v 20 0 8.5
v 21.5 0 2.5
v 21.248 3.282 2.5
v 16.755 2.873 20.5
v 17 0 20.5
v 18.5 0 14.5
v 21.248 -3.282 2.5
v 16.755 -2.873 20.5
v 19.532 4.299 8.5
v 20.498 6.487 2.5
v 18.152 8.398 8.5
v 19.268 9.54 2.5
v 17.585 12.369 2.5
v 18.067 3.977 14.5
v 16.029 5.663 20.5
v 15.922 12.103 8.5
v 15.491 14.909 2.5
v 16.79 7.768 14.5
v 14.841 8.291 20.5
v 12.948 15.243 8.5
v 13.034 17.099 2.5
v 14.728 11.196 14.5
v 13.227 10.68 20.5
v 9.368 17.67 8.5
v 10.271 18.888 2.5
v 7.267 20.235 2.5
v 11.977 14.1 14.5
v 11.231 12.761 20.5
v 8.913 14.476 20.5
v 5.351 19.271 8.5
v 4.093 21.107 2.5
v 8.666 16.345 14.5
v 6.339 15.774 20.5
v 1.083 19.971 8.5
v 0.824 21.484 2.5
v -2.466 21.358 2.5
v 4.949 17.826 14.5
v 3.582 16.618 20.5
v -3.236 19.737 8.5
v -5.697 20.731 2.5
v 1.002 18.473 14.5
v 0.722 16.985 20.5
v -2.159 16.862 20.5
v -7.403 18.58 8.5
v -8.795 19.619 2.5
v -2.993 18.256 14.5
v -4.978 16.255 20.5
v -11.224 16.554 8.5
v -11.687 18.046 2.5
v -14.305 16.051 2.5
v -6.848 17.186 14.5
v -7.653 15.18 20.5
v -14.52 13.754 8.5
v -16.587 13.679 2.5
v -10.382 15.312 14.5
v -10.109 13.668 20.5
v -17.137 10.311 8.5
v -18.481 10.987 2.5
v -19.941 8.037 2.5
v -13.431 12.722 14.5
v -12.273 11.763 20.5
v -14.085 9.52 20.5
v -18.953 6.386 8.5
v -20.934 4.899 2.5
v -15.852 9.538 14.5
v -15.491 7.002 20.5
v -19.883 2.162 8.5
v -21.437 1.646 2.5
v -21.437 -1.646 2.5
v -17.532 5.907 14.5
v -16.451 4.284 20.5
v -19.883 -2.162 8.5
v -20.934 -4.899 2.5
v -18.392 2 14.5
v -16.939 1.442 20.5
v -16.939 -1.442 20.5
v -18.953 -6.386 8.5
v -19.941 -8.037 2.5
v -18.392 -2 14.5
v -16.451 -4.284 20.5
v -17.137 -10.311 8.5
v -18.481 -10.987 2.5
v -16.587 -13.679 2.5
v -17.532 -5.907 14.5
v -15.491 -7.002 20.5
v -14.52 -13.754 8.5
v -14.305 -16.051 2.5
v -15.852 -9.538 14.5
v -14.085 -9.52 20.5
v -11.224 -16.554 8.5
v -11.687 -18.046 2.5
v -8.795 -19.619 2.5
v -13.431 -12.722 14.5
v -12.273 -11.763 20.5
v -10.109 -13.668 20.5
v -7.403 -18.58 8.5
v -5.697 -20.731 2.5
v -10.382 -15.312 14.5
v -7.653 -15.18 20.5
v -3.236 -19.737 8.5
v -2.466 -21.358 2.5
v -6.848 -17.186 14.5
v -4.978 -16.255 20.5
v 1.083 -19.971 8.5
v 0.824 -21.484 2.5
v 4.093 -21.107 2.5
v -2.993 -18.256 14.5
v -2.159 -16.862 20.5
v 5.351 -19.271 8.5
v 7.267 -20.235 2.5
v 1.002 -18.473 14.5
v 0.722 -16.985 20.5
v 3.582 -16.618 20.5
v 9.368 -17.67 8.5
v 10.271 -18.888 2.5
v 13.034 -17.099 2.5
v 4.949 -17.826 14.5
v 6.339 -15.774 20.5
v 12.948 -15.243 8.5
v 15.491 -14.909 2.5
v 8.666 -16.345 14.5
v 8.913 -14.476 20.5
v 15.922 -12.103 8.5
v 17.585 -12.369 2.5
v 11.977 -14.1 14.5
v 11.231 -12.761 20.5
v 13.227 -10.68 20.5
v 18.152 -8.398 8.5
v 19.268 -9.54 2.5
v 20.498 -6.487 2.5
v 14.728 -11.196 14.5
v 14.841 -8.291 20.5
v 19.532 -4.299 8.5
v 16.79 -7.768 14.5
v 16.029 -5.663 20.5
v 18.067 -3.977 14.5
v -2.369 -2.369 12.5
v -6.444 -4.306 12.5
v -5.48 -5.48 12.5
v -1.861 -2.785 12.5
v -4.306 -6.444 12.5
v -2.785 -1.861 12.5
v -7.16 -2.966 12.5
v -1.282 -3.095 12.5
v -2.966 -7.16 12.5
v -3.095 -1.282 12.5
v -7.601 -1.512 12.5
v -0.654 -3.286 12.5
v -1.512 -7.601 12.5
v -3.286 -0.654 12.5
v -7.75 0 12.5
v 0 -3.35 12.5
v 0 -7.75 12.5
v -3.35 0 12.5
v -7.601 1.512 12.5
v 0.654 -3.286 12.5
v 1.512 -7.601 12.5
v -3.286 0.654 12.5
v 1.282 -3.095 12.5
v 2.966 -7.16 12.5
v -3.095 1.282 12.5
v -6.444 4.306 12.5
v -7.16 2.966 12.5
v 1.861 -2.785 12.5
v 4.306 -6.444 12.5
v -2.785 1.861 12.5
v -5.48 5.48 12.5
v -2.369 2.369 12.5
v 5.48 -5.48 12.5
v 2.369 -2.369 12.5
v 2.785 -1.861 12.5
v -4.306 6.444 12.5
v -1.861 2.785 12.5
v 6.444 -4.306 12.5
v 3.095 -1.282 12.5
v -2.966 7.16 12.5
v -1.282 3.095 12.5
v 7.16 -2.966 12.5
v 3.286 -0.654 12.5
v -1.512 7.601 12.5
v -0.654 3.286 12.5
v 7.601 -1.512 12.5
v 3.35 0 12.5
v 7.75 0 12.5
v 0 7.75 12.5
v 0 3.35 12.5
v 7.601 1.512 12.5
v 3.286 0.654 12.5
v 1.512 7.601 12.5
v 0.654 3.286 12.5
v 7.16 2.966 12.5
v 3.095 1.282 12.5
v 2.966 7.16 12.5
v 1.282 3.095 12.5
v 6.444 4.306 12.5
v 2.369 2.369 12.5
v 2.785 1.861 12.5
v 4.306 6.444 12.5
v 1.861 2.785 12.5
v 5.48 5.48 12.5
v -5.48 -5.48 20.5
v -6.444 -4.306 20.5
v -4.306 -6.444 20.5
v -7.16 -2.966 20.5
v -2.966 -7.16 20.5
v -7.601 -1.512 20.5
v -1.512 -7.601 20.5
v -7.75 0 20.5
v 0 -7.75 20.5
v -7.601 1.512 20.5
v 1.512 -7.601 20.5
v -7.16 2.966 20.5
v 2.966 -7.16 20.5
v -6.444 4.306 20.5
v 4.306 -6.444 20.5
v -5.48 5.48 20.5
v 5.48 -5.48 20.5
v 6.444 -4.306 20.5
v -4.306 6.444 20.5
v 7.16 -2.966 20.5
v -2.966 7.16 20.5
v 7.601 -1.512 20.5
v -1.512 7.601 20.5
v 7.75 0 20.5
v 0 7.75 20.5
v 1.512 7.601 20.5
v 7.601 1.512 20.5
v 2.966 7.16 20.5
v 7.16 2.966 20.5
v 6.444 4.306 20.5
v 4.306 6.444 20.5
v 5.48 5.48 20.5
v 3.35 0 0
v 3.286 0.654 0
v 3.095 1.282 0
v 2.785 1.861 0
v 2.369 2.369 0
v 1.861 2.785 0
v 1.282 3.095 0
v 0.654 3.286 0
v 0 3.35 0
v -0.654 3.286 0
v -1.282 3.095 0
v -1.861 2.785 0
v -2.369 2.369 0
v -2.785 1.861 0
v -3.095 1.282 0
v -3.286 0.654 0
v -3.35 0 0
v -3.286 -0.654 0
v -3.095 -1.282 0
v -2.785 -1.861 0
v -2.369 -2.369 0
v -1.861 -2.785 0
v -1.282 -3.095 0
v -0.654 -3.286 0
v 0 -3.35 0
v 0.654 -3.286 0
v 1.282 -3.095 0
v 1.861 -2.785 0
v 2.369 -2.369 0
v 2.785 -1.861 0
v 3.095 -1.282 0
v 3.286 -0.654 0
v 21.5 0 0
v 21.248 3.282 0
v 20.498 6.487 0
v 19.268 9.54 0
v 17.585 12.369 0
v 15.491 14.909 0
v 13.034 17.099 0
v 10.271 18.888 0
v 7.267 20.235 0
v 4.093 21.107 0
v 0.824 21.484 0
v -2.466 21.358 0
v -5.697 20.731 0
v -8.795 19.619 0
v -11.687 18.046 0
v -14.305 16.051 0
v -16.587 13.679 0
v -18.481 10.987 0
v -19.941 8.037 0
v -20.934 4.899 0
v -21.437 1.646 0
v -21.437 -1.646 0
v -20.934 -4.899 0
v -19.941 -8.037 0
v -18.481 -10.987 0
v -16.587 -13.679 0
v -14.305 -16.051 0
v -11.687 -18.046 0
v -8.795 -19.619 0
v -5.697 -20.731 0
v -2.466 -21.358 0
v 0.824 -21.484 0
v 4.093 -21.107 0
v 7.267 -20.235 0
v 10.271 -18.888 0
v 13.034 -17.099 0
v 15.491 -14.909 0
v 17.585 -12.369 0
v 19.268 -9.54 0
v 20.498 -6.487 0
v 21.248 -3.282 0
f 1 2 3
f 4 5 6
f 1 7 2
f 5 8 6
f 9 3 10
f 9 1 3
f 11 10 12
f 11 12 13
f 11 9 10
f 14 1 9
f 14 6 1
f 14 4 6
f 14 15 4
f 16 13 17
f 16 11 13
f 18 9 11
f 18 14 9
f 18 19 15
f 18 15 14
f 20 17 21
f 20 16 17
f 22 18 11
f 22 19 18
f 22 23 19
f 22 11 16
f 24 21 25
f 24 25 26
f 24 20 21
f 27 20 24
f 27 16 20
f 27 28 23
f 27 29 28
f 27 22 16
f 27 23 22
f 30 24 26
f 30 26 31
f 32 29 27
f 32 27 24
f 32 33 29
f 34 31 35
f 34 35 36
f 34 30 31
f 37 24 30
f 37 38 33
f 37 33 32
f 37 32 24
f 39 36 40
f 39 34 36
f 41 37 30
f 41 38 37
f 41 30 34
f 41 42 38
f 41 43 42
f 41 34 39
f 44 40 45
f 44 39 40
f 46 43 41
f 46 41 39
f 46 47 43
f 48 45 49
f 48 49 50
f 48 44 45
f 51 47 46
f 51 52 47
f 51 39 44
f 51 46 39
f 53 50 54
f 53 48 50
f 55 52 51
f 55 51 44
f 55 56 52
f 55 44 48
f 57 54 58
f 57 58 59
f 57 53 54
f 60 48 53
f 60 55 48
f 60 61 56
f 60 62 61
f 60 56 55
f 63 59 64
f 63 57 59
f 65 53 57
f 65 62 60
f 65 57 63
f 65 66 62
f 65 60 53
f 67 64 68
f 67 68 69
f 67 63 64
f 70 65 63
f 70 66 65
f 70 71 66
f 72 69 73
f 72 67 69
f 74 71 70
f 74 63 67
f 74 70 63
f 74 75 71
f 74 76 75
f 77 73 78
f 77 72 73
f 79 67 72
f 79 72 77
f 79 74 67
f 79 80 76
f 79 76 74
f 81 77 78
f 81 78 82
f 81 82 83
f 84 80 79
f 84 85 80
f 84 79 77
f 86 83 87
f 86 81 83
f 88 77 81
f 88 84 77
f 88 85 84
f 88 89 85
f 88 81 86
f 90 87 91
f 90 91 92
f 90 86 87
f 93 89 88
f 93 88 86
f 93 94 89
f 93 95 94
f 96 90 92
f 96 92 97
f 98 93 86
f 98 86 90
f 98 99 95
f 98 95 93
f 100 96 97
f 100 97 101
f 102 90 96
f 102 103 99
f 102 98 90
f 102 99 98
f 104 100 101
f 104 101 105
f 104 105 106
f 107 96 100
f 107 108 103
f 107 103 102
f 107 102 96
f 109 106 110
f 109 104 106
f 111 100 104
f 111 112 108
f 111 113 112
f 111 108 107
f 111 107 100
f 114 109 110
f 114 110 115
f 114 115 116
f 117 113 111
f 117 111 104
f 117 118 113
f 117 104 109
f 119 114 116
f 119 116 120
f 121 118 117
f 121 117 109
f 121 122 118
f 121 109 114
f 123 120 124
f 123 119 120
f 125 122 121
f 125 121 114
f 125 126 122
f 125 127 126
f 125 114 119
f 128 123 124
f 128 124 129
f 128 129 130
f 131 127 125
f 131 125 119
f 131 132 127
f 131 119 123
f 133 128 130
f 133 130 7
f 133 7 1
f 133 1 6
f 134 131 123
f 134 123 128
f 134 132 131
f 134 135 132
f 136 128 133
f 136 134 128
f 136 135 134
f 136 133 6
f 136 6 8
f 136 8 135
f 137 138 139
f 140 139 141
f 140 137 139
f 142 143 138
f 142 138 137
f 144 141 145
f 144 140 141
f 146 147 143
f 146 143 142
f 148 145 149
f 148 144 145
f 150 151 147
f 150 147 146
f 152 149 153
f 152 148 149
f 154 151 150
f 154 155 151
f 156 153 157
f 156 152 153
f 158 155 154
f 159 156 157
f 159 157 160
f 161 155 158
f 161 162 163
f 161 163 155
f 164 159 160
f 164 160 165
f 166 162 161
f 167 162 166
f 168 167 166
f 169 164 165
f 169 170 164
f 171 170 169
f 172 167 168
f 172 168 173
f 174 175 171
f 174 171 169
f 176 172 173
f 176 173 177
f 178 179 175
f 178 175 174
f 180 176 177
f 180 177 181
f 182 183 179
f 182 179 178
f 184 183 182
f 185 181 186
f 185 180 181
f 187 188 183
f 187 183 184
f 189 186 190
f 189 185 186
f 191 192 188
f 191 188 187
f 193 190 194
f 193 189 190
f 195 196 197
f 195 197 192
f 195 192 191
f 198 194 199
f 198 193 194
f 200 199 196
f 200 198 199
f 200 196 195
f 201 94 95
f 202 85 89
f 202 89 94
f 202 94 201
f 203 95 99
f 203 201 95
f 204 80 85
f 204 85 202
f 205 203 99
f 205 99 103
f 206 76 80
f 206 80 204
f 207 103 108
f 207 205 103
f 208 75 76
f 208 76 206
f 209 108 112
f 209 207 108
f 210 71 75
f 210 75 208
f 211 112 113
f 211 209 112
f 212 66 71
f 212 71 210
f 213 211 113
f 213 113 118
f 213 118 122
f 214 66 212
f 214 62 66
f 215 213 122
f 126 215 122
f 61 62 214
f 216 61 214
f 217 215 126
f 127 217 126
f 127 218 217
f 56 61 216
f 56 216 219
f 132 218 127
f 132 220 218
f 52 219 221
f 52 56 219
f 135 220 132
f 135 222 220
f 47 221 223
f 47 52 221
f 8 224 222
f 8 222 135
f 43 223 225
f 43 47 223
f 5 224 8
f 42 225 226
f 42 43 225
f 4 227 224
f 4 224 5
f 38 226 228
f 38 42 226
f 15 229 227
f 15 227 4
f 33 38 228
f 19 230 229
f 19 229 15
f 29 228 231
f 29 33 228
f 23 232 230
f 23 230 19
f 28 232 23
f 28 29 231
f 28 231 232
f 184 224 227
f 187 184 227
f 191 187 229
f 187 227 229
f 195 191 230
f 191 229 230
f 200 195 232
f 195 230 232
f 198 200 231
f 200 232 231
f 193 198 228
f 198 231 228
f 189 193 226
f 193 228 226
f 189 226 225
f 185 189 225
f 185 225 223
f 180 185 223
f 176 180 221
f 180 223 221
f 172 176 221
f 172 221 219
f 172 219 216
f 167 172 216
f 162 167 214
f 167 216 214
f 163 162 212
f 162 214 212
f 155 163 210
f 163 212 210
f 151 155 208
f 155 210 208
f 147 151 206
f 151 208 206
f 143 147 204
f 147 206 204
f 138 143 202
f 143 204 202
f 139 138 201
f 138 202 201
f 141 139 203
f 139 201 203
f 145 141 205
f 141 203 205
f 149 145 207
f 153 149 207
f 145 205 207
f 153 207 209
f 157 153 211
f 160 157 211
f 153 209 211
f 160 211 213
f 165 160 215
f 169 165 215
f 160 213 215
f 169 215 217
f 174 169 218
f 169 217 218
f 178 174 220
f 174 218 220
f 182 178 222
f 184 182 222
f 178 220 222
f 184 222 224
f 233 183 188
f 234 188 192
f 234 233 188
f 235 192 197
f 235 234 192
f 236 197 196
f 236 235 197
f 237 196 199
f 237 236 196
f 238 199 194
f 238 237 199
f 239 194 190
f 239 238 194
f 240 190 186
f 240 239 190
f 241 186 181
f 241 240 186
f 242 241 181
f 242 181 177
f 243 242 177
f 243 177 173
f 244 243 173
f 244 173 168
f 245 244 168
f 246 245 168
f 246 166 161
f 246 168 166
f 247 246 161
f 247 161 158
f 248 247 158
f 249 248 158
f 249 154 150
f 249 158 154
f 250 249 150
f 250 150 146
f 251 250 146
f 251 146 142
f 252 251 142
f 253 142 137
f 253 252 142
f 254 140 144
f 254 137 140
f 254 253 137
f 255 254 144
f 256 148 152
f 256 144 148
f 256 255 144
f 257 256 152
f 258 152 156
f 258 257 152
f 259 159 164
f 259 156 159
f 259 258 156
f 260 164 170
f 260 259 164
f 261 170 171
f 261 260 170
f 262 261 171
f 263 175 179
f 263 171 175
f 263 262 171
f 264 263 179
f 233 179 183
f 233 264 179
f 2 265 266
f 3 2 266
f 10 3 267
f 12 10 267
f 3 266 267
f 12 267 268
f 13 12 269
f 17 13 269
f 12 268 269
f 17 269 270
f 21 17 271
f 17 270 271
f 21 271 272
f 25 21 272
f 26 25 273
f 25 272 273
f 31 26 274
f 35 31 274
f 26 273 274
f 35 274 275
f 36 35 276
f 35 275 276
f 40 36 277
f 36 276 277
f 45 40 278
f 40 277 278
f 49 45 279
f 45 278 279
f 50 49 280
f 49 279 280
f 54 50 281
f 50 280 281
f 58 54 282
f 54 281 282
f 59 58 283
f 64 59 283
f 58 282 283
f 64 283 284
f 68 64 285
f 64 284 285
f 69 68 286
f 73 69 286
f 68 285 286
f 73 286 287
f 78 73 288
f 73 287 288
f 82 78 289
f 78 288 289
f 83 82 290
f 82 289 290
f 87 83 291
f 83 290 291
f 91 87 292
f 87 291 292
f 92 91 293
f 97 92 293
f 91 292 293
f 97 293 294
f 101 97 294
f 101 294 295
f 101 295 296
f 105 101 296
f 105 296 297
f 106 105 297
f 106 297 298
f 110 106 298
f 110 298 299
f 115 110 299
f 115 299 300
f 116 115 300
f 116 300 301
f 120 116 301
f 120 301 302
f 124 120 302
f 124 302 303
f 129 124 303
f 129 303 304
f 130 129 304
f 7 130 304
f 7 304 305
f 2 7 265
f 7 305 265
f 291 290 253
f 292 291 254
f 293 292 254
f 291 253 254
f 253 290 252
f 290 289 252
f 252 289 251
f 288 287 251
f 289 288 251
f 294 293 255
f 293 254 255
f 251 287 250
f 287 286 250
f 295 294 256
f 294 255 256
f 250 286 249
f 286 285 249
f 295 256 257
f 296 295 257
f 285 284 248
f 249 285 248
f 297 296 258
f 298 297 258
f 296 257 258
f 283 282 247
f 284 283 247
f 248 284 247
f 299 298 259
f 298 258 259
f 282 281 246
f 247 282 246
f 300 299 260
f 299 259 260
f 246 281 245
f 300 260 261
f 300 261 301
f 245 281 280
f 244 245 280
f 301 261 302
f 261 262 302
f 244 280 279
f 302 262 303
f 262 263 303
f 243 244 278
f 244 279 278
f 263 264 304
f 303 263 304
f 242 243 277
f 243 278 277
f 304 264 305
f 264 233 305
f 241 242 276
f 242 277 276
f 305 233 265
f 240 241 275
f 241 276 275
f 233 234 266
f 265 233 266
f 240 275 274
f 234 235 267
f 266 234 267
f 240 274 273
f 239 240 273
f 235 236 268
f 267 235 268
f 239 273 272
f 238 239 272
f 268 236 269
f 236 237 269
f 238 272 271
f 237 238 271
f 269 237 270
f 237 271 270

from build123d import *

# Parameters (mm, degrees)
SKETCH_R      = 21.5
SKETCH_R_2    = 3.35
PAD_DEPTH     = 20.5
CHAMFER_SIZE2 = 4.5
CHAMFER_SIZE  = 18
SKETCH001_R   = 7.75
POCKET_DEPTH  = 8


with BuildPart() as part:
    # Sketch → Pad (new body)
    with BuildSketch(Plane.XY):
        Circle(SKETCH_R)
        Circle(SKETCH_R_2, mode=Mode.SUBTRACT)
    extrude(amount=PAD_DEPTH)

    # Chamfer
    chamfer_edges = [part.edges().sort_by_distance(p)[0] for p in [
        (-21.5, 0, 20.5),
    ]]
    chamfer_side = part.faces().sort_by_distance((-21.5, 0, 10.25))[0]
    chamfer(chamfer_edges, length=CHAMFER_SIZE, length2=CHAMFER_SIZE2, reference=chamfer_side)

    # Sketch001 (on Face4 of Chamfer) → Pocket (cut)
    with BuildSketch(Plane.XY.offset(20.5)):
        Circle(SKETCH001_R)
    extrude(amount=-POCKET_DEPTH, mode=Mode.SUBTRACT)


solid = part.part
